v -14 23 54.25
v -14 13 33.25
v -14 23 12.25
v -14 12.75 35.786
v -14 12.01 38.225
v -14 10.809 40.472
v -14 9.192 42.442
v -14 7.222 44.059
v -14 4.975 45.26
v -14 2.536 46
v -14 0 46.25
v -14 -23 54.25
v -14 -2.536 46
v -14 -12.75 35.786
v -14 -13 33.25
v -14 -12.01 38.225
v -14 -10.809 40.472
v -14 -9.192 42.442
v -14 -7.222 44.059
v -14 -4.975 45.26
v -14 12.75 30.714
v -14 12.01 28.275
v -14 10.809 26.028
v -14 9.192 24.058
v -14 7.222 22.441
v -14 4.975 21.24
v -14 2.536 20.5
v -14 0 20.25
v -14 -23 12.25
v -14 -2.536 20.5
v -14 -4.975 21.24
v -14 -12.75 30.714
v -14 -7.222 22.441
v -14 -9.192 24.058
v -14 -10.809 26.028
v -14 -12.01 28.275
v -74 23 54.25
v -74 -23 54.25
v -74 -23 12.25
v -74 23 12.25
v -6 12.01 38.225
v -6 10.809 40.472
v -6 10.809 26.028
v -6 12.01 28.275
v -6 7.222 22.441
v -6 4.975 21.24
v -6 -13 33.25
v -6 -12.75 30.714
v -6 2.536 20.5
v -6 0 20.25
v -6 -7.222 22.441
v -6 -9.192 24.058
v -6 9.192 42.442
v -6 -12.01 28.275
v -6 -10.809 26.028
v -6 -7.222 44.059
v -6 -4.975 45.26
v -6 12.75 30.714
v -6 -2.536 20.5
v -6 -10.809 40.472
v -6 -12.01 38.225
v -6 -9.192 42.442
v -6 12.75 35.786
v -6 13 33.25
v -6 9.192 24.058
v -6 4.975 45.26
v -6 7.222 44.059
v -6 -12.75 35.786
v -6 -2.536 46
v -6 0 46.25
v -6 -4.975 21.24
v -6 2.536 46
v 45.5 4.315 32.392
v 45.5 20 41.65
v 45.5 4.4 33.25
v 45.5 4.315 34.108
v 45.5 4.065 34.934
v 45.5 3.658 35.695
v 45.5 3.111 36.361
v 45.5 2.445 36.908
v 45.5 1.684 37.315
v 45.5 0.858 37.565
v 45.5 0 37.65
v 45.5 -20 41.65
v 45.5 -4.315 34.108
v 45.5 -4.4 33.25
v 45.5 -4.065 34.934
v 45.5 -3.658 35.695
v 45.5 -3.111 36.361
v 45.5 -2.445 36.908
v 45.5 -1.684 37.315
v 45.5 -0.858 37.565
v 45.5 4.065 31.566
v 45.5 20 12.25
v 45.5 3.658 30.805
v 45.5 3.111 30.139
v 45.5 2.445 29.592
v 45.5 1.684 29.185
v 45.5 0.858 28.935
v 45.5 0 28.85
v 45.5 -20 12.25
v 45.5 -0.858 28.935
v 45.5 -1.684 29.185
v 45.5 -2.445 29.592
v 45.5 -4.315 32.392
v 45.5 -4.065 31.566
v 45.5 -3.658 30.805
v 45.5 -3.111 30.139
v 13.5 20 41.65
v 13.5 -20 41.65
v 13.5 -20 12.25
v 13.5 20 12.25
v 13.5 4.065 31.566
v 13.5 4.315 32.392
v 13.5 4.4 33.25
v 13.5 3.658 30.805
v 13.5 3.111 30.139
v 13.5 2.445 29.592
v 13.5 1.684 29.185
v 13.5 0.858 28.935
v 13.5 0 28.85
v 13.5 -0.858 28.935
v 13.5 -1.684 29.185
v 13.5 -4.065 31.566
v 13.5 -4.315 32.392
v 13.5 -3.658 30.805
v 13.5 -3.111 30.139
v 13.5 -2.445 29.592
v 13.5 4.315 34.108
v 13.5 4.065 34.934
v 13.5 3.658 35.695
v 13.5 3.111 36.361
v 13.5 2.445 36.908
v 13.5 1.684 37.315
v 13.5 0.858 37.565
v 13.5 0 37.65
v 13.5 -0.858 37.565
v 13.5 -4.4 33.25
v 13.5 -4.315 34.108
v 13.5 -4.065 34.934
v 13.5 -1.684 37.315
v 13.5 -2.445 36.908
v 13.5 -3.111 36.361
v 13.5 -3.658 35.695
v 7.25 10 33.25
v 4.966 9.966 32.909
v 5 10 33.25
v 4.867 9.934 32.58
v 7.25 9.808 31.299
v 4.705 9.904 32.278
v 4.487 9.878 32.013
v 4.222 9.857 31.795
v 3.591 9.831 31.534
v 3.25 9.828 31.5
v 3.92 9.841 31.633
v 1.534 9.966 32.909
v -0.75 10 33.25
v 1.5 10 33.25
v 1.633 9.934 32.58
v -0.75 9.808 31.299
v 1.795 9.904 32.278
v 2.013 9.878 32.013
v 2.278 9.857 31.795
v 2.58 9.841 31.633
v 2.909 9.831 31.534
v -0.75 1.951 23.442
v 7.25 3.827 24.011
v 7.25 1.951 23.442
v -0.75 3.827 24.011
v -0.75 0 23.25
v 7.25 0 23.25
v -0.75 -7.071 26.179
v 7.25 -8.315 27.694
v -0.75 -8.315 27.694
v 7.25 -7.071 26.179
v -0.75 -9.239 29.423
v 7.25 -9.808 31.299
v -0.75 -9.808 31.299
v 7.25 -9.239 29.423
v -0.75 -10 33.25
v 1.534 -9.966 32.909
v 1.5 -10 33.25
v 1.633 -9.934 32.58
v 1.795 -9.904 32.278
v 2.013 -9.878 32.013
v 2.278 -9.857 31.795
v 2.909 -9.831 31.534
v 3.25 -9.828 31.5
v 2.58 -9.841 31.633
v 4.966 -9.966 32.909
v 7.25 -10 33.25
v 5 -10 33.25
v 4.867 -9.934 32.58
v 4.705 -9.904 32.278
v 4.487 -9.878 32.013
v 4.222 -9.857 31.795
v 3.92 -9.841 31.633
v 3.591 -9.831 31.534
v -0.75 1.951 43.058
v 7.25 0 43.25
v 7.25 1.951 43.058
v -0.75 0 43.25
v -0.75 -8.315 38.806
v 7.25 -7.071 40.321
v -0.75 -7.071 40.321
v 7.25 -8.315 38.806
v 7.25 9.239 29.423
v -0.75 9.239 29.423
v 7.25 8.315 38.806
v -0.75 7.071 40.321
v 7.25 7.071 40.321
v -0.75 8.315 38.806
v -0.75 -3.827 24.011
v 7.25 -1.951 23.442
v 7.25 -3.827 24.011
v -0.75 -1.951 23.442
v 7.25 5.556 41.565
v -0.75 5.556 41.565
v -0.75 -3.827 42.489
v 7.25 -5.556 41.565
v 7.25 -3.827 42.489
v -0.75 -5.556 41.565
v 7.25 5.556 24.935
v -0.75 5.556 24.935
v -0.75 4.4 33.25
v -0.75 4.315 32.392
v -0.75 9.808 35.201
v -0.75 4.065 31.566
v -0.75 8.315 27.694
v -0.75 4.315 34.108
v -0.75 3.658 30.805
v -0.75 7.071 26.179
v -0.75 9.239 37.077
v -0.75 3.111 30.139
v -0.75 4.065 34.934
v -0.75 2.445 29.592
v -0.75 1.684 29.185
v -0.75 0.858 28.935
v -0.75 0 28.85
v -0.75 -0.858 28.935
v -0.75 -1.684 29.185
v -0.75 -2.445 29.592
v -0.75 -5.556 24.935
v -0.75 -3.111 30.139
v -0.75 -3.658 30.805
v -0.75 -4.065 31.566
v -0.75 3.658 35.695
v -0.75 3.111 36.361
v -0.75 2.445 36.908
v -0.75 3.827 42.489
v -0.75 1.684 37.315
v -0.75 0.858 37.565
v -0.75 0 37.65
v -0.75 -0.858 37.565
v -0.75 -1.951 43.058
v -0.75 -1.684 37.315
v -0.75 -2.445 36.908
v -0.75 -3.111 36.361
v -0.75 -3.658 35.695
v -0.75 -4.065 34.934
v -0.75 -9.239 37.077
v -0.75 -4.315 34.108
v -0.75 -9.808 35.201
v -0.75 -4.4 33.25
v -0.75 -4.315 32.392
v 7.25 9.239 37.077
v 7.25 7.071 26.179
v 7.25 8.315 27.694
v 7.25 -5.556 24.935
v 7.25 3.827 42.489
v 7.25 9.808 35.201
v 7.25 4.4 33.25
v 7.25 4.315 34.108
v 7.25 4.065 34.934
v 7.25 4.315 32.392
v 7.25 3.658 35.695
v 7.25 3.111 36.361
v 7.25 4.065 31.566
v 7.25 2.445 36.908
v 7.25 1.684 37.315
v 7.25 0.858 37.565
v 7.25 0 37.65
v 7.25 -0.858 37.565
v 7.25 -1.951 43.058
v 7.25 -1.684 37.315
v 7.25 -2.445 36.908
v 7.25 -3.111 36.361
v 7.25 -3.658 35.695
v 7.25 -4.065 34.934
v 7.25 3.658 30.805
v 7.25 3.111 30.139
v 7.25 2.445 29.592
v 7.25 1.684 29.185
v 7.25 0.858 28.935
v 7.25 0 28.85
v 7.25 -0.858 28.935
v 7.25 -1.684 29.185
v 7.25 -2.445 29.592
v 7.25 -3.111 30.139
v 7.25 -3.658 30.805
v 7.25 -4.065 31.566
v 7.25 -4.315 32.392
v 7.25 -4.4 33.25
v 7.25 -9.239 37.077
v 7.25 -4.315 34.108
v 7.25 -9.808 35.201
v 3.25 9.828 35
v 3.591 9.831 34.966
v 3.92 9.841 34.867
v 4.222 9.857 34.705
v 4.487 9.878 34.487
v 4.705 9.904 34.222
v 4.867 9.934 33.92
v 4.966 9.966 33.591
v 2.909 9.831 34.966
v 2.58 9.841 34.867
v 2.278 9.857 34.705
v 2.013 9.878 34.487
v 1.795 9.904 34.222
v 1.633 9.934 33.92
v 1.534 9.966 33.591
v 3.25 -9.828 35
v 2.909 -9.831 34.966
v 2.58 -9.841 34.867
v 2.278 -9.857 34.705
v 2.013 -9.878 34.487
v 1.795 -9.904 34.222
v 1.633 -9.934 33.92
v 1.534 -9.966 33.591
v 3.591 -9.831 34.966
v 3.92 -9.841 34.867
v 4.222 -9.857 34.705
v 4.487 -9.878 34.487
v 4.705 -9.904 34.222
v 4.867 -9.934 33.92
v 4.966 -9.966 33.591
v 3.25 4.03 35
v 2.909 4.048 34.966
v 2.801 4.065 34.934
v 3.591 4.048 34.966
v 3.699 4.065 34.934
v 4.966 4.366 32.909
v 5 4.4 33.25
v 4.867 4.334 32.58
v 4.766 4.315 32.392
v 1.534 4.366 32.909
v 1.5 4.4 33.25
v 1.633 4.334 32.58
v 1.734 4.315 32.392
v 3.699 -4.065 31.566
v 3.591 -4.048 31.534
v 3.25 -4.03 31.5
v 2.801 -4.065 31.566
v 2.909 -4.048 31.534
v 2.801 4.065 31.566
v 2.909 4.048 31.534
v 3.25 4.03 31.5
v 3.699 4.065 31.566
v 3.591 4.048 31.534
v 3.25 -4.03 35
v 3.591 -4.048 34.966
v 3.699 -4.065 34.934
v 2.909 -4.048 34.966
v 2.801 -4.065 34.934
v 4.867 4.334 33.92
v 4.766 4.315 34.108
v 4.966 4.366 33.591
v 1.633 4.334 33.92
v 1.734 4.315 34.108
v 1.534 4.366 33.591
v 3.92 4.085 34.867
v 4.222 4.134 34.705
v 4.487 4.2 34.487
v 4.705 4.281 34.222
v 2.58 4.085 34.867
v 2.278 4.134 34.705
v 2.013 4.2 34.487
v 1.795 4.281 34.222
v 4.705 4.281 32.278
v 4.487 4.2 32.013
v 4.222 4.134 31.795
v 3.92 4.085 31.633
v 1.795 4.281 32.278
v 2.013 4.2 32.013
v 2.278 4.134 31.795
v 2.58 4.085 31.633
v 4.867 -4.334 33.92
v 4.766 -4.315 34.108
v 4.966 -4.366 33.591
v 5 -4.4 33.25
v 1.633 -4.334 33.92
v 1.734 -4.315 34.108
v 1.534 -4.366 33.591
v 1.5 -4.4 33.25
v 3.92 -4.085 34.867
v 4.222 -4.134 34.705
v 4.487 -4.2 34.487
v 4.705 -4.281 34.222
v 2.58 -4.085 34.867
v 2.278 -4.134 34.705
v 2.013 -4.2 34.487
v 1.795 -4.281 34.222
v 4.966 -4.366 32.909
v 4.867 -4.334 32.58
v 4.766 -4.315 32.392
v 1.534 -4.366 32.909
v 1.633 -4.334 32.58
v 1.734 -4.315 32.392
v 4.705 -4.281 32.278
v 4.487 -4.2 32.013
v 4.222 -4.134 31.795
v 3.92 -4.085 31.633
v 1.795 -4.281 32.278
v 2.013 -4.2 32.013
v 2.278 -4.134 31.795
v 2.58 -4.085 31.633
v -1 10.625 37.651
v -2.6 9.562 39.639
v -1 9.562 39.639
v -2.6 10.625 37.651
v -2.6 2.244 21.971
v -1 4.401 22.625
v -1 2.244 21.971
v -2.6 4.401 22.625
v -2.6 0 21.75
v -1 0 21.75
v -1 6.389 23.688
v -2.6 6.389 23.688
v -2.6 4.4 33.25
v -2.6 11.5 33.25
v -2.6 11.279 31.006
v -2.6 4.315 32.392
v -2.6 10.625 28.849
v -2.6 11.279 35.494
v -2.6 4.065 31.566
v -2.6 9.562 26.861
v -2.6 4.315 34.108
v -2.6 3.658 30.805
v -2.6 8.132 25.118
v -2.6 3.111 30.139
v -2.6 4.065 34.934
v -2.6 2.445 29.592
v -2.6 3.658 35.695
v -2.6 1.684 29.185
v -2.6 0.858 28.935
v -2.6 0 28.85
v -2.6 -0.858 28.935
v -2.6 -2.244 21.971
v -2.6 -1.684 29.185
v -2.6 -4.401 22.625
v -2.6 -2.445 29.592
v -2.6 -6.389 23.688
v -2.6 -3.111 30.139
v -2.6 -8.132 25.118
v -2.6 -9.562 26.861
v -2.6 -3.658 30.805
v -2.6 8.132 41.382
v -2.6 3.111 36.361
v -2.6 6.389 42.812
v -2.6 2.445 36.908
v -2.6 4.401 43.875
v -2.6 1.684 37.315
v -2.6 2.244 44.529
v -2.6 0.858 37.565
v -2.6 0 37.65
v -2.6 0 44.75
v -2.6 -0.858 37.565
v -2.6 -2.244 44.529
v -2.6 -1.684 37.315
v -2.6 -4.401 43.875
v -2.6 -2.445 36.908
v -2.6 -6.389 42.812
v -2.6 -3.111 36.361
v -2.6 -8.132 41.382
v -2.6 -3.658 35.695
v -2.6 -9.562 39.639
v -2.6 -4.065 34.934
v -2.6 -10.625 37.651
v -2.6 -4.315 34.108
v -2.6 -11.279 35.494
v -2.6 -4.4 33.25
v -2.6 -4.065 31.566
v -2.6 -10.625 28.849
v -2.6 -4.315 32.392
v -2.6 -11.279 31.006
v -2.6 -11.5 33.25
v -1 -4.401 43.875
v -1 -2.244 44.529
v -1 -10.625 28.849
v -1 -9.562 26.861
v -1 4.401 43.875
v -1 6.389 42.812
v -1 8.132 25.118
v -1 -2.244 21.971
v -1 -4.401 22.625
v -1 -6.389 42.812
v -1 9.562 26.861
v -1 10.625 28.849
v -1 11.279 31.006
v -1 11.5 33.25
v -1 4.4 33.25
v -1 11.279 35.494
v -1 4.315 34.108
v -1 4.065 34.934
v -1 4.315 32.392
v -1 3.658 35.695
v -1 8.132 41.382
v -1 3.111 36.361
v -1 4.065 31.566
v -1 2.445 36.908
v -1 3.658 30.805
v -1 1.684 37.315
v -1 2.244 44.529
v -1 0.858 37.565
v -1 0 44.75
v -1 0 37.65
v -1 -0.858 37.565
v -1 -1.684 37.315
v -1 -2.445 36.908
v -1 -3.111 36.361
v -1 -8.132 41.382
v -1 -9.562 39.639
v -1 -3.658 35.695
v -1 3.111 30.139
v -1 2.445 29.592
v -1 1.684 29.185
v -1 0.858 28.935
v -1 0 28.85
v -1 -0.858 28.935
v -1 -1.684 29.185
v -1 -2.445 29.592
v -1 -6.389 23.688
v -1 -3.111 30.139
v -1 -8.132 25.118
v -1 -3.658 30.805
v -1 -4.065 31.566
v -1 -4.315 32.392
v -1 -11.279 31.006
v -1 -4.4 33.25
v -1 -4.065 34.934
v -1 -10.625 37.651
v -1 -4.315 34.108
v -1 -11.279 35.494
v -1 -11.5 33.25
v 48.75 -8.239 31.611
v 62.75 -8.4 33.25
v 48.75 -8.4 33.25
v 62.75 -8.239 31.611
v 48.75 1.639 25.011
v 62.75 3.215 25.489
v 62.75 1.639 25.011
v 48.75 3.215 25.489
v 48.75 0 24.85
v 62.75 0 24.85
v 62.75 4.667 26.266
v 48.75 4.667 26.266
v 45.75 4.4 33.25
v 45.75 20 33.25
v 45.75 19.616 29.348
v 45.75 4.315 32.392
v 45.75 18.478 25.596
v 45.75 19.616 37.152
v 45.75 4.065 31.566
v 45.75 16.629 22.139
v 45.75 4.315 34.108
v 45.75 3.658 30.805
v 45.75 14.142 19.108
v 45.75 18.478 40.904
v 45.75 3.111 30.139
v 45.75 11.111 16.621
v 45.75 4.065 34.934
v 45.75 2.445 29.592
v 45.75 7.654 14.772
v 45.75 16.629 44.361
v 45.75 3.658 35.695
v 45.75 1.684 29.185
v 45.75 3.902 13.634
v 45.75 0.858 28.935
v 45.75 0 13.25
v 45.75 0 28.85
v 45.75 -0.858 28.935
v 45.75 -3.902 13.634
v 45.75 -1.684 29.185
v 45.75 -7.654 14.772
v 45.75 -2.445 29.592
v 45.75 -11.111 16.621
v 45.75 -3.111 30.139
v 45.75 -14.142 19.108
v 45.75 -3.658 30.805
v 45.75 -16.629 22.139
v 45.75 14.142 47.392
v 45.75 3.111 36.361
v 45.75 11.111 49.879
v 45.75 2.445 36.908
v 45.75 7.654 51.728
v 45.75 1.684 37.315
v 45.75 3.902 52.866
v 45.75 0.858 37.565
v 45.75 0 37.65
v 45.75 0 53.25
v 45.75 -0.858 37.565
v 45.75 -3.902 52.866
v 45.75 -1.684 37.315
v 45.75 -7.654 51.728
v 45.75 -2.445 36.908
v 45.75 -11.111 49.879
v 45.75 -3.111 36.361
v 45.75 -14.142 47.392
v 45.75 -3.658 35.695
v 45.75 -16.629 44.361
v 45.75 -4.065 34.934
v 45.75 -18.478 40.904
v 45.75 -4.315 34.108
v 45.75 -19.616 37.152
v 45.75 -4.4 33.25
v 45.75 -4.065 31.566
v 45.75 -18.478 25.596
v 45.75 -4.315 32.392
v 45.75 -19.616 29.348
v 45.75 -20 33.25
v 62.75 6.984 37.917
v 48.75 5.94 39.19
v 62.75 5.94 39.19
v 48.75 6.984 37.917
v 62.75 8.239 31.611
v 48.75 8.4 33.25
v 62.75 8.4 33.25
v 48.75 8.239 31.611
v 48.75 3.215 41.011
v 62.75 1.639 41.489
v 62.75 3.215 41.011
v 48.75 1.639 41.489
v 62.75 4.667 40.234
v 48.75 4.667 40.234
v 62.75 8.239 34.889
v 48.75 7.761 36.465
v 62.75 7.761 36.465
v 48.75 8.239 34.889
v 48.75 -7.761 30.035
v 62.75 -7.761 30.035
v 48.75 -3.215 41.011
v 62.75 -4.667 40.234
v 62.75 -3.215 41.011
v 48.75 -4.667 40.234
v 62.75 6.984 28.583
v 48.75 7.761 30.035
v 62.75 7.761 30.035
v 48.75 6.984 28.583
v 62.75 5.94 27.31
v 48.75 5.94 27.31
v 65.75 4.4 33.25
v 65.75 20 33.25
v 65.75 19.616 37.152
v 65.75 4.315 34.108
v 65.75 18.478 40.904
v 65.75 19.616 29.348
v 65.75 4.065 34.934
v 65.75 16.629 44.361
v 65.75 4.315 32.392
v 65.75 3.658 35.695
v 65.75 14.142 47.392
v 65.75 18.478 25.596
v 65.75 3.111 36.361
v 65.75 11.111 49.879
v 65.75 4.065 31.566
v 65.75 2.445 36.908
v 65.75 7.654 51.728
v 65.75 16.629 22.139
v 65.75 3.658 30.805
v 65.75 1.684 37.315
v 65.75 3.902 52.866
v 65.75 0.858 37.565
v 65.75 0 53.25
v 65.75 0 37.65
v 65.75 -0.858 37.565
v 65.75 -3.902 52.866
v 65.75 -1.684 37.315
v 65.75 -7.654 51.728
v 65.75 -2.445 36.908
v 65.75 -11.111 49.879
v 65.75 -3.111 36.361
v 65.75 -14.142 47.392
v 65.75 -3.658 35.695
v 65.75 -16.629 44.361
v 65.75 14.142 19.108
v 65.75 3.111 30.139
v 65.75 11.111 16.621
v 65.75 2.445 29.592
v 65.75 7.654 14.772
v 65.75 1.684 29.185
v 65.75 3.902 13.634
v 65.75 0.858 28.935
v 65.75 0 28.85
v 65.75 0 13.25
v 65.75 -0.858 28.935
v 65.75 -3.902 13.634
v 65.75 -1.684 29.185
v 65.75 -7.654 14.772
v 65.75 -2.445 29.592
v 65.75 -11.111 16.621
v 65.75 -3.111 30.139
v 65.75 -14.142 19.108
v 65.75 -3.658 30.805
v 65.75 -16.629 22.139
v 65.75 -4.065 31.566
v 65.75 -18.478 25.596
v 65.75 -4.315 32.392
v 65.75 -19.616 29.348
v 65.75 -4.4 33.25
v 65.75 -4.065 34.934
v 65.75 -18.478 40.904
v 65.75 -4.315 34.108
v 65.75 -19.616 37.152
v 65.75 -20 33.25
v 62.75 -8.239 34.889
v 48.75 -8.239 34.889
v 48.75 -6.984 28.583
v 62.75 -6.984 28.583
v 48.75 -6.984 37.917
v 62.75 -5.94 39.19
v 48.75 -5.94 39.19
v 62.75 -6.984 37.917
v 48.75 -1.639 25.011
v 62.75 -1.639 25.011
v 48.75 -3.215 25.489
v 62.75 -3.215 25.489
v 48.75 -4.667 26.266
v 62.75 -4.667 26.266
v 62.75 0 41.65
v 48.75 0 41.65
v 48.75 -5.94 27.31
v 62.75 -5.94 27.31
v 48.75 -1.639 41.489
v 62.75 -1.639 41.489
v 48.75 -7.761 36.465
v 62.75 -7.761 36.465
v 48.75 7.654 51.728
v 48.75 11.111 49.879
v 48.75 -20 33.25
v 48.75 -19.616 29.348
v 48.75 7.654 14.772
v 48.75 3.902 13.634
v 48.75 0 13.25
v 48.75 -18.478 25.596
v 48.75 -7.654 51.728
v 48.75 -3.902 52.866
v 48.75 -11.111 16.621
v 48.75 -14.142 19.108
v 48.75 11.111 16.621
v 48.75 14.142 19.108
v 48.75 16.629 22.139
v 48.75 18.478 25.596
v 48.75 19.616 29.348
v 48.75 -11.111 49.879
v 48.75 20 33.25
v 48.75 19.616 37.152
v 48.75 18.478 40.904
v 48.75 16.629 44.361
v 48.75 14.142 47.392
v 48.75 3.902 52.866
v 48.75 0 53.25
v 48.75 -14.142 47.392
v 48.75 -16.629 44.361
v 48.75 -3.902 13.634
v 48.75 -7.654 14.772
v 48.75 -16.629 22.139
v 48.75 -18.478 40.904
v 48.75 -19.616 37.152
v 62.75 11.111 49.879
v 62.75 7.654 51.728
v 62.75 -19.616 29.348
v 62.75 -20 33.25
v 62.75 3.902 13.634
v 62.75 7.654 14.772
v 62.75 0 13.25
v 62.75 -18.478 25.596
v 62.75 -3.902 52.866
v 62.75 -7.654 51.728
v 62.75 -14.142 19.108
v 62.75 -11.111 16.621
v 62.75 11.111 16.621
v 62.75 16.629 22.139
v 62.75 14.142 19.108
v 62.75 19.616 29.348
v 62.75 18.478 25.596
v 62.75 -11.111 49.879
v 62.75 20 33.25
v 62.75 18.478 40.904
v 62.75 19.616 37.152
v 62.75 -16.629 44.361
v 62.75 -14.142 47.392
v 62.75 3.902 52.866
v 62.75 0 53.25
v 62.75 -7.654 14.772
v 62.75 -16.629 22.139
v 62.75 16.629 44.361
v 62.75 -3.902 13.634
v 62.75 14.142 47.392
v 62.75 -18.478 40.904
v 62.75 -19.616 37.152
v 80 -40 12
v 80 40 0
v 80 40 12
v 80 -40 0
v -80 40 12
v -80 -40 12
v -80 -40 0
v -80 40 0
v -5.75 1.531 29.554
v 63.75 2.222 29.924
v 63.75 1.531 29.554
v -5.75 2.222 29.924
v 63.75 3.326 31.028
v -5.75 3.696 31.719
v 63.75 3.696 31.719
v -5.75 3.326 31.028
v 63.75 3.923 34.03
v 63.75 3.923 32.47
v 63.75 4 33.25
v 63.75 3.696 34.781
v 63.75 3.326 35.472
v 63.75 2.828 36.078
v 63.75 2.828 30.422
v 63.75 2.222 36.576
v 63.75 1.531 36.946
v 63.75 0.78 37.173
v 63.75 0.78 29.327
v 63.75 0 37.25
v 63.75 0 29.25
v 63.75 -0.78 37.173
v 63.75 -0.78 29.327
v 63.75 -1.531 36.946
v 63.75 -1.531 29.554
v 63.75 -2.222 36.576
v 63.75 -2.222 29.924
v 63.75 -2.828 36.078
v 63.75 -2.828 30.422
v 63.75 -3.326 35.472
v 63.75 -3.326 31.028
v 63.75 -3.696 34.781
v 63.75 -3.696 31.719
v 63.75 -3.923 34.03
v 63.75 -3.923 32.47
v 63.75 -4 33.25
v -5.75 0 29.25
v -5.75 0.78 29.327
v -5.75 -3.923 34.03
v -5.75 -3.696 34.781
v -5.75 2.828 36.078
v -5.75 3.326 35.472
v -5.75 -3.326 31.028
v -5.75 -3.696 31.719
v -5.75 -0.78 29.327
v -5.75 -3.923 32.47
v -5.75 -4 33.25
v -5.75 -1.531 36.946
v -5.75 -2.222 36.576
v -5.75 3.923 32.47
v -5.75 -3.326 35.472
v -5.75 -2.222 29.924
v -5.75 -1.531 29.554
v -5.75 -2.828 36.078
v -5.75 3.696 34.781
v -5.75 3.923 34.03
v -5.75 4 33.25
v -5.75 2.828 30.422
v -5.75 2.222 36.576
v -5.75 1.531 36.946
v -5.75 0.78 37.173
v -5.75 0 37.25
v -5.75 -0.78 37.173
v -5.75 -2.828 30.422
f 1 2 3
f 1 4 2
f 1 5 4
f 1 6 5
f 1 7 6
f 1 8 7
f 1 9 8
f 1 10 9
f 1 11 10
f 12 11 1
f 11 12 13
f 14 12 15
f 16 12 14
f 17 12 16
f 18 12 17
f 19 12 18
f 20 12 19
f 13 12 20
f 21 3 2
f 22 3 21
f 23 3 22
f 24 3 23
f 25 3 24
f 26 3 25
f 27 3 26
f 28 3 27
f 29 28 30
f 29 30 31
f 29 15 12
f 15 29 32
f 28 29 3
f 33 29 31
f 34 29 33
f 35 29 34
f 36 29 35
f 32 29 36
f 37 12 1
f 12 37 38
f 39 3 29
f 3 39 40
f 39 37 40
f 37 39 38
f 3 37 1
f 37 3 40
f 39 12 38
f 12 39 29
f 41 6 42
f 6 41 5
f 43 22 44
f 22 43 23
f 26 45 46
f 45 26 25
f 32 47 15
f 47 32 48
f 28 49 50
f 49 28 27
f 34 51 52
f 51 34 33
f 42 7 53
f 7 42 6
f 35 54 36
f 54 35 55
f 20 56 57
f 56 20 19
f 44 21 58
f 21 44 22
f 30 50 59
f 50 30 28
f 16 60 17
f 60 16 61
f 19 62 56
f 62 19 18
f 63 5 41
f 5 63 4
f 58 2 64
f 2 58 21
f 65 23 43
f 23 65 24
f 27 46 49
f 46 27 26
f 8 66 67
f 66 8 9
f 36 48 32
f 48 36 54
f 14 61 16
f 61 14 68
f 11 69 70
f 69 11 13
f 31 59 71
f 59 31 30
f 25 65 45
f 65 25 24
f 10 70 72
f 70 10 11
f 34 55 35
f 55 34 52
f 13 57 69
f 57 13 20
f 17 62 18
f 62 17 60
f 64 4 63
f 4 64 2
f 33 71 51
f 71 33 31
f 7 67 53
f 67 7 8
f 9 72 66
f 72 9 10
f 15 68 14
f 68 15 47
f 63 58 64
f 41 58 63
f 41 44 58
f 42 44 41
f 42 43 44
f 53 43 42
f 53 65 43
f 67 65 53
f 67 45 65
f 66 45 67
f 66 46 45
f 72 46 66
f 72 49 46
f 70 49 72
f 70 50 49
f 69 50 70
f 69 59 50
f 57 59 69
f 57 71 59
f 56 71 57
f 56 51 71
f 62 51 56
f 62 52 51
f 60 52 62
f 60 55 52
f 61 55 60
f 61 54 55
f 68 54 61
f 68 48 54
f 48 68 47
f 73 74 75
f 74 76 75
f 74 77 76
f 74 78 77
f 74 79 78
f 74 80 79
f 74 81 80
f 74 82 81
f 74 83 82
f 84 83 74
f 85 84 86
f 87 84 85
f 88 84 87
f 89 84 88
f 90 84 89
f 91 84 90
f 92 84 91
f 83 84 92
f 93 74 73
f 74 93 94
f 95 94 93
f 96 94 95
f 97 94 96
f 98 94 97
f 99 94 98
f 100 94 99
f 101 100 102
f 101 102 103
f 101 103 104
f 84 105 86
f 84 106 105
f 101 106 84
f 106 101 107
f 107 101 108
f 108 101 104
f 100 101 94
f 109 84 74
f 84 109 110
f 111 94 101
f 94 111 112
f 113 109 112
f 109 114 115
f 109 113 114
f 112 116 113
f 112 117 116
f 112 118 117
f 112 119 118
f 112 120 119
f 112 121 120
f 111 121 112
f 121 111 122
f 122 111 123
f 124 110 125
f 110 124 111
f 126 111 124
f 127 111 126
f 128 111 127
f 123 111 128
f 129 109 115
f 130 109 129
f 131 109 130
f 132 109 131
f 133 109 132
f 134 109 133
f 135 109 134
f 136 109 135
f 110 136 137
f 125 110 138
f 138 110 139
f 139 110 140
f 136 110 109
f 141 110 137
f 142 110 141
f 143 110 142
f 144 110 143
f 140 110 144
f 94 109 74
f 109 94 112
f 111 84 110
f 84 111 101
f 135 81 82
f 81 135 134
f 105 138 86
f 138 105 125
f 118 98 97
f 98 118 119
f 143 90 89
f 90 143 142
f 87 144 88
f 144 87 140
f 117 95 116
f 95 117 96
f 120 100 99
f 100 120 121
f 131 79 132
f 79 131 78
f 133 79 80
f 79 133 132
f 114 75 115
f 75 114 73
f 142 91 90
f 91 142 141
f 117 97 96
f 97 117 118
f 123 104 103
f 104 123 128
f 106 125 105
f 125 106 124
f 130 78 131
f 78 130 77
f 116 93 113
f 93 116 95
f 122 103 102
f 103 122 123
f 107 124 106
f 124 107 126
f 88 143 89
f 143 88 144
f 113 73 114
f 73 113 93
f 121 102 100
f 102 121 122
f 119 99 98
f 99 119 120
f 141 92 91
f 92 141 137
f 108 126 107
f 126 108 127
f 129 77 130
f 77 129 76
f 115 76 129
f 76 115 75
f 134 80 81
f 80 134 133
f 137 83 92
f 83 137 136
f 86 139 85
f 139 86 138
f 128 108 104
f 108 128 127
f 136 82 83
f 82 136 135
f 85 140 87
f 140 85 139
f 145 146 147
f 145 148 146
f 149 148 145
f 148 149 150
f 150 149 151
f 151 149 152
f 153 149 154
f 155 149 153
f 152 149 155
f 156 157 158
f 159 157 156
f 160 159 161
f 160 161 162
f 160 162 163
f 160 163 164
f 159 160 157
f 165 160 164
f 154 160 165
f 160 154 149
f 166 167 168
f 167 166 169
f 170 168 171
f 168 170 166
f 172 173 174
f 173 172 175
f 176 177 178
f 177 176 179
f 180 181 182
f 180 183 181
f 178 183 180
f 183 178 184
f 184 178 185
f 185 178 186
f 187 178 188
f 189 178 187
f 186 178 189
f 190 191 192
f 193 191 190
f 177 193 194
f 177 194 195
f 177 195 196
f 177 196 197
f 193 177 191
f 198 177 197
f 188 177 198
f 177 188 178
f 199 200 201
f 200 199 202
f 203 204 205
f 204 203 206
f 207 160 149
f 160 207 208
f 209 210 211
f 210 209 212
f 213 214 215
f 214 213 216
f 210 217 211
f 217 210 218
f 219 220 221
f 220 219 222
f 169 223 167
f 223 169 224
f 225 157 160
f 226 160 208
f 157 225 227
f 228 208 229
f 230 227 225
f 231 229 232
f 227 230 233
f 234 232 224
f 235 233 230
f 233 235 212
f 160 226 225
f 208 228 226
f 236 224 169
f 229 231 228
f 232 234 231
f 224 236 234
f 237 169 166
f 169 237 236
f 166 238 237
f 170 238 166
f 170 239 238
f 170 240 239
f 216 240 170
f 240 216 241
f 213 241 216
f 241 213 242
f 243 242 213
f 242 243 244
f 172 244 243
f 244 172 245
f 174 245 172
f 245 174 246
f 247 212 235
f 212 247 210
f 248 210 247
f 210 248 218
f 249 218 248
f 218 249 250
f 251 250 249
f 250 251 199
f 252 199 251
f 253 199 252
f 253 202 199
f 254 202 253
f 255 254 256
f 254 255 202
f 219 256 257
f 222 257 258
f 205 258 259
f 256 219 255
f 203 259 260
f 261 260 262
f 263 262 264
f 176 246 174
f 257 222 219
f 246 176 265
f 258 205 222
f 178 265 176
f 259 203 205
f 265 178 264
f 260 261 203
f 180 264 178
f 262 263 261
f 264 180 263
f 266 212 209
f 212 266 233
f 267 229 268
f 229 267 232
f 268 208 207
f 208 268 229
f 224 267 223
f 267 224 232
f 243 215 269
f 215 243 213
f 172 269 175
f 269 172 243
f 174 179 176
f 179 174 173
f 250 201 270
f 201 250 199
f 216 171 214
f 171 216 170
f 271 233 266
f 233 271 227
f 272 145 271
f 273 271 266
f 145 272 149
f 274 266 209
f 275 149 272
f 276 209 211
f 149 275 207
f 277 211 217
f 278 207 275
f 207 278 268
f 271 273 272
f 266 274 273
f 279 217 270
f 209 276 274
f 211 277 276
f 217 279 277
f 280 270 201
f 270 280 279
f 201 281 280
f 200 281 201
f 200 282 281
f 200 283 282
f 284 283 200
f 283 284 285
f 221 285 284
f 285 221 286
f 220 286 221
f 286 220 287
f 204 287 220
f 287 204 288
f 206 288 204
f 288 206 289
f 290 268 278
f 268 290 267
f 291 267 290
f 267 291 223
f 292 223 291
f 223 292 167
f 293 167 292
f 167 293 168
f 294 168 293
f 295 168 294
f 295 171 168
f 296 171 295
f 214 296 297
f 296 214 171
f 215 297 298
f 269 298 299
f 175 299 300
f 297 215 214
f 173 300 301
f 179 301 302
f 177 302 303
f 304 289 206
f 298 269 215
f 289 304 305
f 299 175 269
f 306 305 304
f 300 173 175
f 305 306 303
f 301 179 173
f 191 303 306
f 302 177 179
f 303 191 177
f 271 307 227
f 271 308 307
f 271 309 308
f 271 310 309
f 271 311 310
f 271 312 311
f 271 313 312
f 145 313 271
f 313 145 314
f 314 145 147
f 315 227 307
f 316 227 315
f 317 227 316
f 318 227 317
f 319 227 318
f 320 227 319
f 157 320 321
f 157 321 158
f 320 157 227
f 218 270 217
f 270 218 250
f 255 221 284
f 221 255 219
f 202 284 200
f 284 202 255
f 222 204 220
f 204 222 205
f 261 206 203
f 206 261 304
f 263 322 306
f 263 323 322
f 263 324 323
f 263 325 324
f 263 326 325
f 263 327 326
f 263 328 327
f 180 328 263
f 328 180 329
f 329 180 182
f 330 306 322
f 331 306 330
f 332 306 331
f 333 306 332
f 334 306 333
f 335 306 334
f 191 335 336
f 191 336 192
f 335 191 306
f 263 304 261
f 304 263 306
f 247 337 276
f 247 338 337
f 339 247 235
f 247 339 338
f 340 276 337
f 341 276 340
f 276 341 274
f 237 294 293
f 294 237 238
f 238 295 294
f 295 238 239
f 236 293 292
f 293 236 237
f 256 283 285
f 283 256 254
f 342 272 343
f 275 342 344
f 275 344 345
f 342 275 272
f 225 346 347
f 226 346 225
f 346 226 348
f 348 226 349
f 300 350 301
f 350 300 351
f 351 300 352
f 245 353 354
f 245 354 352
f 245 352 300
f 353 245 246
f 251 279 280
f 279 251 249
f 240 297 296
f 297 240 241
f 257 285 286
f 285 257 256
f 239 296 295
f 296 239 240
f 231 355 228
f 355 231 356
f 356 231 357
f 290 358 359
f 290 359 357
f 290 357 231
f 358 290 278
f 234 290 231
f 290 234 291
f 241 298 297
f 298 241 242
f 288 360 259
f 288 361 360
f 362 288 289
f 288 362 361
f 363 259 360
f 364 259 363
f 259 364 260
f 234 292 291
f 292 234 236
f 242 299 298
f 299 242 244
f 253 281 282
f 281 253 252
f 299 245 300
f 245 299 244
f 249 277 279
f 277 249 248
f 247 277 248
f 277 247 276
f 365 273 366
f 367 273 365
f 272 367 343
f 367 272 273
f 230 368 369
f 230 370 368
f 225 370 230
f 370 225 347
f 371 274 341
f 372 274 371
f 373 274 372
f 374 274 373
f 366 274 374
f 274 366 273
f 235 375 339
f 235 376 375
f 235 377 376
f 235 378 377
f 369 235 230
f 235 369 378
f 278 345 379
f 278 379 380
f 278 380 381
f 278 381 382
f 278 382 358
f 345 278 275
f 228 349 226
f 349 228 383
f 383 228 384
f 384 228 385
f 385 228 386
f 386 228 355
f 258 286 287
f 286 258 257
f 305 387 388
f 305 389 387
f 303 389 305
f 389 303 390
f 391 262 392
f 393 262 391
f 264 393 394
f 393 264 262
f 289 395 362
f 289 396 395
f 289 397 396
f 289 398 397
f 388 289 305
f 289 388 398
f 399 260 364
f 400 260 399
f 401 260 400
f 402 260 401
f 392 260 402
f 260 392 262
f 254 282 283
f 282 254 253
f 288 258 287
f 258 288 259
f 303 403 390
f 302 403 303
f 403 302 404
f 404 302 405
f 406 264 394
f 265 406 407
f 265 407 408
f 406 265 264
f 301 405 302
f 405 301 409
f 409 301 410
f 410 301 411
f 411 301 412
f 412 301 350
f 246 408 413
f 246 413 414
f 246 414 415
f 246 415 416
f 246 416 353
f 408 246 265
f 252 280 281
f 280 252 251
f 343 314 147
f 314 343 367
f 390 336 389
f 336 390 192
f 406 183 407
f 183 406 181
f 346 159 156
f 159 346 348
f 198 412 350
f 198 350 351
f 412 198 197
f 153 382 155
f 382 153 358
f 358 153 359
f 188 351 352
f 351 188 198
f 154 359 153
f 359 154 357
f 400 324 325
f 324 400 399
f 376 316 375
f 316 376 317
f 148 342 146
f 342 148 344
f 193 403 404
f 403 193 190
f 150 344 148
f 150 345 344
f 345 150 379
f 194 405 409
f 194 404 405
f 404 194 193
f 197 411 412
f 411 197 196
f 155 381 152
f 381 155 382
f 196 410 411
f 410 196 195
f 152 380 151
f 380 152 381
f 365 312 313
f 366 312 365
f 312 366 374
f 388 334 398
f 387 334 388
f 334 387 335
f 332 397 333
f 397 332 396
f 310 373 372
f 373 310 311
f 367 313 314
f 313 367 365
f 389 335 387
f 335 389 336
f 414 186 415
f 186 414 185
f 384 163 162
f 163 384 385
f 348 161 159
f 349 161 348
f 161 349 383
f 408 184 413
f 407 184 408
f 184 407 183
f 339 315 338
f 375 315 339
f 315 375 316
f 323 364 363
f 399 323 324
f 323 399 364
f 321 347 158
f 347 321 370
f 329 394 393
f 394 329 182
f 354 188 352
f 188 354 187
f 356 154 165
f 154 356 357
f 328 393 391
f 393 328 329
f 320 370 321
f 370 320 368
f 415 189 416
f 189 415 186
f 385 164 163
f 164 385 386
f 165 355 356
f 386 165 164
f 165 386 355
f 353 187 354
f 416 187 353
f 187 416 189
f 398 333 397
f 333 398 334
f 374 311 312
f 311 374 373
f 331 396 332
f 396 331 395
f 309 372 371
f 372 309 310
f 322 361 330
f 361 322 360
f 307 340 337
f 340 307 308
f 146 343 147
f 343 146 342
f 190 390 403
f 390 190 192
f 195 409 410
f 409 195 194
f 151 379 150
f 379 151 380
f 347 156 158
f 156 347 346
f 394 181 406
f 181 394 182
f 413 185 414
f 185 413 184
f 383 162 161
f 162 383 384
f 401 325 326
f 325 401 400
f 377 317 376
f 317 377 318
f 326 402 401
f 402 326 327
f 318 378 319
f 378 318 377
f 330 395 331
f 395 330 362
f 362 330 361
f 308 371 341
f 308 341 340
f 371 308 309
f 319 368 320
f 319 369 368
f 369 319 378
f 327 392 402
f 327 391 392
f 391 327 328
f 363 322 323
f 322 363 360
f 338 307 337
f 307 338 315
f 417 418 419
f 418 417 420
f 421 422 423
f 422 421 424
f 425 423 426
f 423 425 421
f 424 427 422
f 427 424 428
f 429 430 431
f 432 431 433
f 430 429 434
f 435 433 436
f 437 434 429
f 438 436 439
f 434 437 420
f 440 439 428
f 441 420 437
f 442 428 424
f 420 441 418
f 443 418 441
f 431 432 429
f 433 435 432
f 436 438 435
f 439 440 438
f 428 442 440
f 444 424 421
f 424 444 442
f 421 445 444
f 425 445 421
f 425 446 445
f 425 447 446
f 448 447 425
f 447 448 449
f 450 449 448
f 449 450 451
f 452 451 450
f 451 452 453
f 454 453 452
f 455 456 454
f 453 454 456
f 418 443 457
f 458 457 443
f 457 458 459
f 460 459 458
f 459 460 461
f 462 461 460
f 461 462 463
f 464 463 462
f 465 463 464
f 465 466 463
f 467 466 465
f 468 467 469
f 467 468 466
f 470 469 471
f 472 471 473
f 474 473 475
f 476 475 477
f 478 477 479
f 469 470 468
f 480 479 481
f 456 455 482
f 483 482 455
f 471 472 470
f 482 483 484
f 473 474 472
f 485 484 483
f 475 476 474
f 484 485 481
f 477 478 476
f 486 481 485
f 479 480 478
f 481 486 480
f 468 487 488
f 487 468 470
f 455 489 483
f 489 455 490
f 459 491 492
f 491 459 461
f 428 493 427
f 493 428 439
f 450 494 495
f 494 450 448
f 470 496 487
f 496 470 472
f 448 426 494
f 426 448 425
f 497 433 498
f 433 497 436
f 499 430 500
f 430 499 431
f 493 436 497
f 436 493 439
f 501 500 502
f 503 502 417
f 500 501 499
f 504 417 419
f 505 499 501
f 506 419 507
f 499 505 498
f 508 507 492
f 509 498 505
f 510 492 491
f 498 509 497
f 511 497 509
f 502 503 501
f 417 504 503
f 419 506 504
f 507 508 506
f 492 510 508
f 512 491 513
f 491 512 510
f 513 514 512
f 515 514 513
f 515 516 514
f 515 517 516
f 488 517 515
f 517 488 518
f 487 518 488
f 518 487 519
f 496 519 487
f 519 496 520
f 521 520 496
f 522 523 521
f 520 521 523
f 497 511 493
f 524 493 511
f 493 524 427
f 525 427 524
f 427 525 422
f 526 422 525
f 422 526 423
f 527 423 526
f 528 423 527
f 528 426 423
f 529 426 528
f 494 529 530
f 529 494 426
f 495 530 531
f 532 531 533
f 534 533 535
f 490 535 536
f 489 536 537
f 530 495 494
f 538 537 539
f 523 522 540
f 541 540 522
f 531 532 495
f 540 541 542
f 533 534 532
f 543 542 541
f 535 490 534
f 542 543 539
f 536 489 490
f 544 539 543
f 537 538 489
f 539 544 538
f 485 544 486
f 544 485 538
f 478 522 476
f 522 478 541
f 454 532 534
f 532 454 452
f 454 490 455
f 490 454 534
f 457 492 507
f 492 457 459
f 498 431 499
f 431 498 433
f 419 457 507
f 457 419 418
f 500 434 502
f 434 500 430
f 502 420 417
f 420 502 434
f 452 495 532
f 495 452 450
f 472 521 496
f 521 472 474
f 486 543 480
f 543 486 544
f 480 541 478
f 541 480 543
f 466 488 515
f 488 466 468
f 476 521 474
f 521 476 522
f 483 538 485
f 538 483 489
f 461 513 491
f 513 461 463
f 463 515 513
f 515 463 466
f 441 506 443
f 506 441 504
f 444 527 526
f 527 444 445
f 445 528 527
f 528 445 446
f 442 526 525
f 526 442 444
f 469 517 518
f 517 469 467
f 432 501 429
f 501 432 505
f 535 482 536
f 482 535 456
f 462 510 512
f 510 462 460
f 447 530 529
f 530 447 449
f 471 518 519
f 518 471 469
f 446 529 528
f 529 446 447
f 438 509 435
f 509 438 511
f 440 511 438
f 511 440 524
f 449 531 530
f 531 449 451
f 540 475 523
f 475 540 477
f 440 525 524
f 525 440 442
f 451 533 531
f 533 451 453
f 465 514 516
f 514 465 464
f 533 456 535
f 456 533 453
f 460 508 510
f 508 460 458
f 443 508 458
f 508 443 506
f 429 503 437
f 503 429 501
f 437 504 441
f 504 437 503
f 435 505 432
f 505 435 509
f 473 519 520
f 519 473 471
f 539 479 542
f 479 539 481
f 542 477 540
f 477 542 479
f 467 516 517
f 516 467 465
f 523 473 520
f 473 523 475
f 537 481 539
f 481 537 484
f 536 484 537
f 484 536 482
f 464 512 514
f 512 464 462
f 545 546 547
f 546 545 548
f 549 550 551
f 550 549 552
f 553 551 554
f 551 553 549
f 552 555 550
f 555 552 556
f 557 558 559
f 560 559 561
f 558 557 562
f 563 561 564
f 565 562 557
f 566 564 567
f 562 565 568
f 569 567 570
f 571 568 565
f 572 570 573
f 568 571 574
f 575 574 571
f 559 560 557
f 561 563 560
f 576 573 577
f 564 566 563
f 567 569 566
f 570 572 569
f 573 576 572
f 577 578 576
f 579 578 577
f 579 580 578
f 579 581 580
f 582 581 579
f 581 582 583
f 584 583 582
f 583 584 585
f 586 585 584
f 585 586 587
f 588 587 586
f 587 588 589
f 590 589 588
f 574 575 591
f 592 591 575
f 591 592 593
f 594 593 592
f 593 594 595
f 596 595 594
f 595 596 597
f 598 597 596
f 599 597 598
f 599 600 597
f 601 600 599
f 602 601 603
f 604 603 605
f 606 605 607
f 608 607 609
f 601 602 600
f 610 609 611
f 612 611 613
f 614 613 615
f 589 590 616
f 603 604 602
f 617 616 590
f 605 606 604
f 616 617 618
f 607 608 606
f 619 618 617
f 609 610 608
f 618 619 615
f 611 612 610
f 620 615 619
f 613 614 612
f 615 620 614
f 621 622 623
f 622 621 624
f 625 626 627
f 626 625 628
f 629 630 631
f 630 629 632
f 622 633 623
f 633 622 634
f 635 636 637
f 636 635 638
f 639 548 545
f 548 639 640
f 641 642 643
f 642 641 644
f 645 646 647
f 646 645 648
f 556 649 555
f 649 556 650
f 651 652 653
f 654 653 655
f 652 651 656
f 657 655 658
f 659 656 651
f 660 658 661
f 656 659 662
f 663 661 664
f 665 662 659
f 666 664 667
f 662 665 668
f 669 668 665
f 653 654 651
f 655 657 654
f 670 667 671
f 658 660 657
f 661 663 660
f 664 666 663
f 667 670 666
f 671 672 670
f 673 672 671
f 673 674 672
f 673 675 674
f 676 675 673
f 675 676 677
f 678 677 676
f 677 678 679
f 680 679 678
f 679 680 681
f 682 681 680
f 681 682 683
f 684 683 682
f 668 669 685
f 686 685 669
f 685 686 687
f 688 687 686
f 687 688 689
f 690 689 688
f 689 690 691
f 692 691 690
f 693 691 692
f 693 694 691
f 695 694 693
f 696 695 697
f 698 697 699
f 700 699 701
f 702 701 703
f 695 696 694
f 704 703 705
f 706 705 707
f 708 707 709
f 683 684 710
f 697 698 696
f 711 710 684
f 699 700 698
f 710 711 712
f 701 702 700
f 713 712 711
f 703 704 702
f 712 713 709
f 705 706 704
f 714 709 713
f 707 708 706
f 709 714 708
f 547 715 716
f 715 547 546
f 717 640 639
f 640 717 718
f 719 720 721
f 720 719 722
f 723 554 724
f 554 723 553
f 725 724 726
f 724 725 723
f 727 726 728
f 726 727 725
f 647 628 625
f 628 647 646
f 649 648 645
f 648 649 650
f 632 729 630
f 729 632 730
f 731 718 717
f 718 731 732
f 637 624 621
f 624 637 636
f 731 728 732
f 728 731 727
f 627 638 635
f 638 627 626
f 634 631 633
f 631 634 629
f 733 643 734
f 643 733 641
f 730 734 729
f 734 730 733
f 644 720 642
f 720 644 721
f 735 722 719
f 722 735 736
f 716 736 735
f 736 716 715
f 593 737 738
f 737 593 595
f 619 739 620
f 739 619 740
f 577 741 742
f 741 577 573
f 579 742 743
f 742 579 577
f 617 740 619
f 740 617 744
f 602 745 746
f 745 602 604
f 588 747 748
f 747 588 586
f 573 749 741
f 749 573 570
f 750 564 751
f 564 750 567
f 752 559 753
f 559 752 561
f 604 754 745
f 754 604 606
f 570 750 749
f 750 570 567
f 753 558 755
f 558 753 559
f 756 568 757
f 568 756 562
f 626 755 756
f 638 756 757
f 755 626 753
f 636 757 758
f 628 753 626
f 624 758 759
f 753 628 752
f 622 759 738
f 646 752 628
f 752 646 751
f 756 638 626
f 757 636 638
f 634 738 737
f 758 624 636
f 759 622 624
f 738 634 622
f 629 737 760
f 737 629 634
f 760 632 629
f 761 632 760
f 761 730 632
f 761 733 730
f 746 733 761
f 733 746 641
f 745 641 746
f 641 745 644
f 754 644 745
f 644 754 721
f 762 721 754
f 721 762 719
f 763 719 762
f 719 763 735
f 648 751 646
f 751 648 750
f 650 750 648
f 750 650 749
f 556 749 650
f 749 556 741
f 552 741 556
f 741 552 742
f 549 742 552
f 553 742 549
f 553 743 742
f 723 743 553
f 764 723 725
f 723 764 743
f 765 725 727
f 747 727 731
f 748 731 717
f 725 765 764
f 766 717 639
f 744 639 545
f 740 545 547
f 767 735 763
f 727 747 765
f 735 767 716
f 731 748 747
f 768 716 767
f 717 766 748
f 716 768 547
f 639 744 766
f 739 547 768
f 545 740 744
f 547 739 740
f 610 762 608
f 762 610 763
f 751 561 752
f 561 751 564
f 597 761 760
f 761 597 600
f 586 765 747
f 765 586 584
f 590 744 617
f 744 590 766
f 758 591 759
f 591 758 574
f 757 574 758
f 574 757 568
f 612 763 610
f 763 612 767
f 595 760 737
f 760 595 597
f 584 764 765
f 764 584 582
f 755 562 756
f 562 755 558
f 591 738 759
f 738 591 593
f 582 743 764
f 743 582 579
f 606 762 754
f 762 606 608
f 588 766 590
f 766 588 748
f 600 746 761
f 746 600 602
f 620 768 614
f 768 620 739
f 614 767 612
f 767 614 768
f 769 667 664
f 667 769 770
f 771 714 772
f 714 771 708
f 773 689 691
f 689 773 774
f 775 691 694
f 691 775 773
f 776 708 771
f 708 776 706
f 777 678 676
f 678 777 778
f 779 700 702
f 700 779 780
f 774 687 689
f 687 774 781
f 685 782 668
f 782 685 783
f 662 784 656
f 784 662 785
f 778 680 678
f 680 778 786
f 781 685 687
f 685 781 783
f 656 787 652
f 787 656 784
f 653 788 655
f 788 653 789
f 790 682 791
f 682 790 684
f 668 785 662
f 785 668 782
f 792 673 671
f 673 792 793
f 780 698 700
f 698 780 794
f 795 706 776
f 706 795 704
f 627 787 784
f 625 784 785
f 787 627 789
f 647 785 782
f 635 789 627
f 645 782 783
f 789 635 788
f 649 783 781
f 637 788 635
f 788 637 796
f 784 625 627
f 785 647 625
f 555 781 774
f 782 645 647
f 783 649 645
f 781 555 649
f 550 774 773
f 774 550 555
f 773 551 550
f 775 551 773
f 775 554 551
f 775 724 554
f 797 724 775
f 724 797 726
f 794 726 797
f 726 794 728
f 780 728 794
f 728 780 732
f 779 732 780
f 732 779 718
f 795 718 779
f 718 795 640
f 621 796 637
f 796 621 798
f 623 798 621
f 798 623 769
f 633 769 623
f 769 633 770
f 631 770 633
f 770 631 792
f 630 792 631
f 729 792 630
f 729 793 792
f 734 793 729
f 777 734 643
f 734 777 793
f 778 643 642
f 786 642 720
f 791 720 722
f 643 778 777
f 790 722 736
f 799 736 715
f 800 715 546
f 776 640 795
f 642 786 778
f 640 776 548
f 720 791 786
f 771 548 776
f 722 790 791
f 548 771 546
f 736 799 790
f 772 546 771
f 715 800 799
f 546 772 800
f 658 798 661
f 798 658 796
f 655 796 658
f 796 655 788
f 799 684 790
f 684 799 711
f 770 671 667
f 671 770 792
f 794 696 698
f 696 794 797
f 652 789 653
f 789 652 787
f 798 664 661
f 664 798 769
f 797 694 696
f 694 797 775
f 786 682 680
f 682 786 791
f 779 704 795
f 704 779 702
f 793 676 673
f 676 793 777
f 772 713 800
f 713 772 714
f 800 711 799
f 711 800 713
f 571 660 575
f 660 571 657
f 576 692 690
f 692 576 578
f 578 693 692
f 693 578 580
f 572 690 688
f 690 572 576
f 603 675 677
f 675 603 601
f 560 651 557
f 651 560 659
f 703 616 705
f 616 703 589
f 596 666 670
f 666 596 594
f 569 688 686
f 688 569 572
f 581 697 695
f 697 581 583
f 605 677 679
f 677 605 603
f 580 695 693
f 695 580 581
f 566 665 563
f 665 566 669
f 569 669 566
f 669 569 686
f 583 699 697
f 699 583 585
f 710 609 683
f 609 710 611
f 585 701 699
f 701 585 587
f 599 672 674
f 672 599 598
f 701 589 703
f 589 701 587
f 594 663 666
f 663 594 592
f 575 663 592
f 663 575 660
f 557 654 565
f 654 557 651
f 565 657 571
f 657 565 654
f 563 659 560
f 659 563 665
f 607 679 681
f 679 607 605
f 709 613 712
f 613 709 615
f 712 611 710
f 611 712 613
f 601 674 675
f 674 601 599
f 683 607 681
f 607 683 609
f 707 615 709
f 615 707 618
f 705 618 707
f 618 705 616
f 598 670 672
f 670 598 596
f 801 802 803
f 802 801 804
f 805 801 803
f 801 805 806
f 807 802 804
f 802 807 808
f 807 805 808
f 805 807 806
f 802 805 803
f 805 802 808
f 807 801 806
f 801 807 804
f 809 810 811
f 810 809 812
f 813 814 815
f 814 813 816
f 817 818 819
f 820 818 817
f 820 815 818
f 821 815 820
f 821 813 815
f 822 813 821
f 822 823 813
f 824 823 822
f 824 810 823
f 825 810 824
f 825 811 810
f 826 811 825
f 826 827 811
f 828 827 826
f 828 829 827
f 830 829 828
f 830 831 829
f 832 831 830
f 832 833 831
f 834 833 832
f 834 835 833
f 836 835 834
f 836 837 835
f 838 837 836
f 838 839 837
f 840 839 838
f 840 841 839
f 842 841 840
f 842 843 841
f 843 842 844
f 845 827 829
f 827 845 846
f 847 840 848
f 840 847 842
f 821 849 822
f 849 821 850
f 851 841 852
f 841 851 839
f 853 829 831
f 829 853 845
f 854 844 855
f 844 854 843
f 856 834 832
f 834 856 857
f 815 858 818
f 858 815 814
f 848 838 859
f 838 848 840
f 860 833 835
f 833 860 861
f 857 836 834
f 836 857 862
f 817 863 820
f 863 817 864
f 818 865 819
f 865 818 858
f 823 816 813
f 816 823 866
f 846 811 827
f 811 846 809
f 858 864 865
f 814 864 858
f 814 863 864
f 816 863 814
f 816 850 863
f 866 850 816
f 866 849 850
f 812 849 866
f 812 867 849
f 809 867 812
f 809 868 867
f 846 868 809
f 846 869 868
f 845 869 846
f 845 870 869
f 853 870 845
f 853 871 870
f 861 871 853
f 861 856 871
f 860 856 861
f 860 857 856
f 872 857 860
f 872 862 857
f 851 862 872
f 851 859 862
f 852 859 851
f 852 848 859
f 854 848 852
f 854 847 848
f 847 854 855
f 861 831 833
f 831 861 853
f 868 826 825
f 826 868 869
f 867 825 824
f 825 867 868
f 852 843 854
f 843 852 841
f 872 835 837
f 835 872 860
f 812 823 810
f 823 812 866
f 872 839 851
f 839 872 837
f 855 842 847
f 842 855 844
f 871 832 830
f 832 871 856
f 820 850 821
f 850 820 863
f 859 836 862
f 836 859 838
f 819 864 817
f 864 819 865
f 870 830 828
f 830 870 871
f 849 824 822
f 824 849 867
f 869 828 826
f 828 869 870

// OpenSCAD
$fn = 32;

// ------------------------------------------------------------------------
// Motor drive station: motor 60 x 42 mm, shaft d8, pulley d40
// Every part is its own module, assembly() places every instance.
// ------------------------------------------------------------------------

// --- part 1 ---
module station_bed() {
  difference() {
    translate([-80, -40, 0]) cube([160, 80, 12]);
  }
}

// --- part 2 ---
module drive_motor() {
  union() {
    translate([-30, -23, 0]) cube([60, 46, 42]);
    translate([34, 0, 21]) rotate([0, 90, 0]) cylinder(h = 8, d = 26, center = true);
  }
}

// --- part 3 ---
module pillow_block() {
  difference() {
    translate([-16, -20, 0]) cube([32, 40, 29.4]);
    translate([0, 0, 21]) rotate([0, 90, 0]) cylinder(h = 34, d = 8.8, center = true);
  }
}

// --- part 4 ---
module drive_shaft() {
  translate([0, 0, -34.75]) cylinder(h = 69.5, d = 8);
}

// --- part 5 ---
module shaft_collar() {
  difference() {
    cylinder(h = 8, d = 20);
    translate([0, 0, -1]) cylinder(h = 10, d = 8.8);
    translate([0, 0, 4]) rotate([90, 0, 0]) cylinder(h = 22, d = 3.5, center = true);
  }
}

// --- part 6 ---
module collar_washer() {
  difference() {
      translate([0, 0, 0]) cylinder(h = 1.6, d = 23);
      translate([0, 0, -1]) cylinder(h = 3.6, d = 8.8);
    }
}

// --- part 7 ---
module drive_pulley() {
  difference() {
    union() {
      cylinder(h = 20, d = 16.8);
      cylinder(h = 3, d = 40);
      translate([0, 0, 17]) cylinder(h = 3, d = 40);
    }
    translate([0, 0, -1]) cylinder(h = 22, d = 8.8);
  }
}

// --- assembly ---
module assembly() {
  color([0.80, 0.24, 0.20]) translate([0, 0, 0]) rotate([0, 0, 0]) station_bed();
  color([0.20, 0.45, 0.75]) translate([-44, 0, 12.25]) rotate([0, 0, 0]) drive_motor();
  color([0.25, 0.62, 0.32]) translate([29.5, 0, 12.25]) rotate([0, 0, 0]) pillow_block();
  color([0.92, 0.70, 0.18]) translate([29, 0, 33.25]) rotate([0, 90, 0]) drive_shaft();
  color([0.58, 0.35, 0.70]) translate([-0.75, 0, 33.25]) rotate([0, 90, 0]) shaft_collar();
  color([0.16, 0.66, 0.66]) translate([-2.6, 0, 33.25]) rotate([0, 90, 0]) collar_washer();
  color([0.85, 0.48, 0.18]) translate([45.75, 0, 33.25]) rotate([0, 90, 0]) drive_pulley();
}

assembly();
